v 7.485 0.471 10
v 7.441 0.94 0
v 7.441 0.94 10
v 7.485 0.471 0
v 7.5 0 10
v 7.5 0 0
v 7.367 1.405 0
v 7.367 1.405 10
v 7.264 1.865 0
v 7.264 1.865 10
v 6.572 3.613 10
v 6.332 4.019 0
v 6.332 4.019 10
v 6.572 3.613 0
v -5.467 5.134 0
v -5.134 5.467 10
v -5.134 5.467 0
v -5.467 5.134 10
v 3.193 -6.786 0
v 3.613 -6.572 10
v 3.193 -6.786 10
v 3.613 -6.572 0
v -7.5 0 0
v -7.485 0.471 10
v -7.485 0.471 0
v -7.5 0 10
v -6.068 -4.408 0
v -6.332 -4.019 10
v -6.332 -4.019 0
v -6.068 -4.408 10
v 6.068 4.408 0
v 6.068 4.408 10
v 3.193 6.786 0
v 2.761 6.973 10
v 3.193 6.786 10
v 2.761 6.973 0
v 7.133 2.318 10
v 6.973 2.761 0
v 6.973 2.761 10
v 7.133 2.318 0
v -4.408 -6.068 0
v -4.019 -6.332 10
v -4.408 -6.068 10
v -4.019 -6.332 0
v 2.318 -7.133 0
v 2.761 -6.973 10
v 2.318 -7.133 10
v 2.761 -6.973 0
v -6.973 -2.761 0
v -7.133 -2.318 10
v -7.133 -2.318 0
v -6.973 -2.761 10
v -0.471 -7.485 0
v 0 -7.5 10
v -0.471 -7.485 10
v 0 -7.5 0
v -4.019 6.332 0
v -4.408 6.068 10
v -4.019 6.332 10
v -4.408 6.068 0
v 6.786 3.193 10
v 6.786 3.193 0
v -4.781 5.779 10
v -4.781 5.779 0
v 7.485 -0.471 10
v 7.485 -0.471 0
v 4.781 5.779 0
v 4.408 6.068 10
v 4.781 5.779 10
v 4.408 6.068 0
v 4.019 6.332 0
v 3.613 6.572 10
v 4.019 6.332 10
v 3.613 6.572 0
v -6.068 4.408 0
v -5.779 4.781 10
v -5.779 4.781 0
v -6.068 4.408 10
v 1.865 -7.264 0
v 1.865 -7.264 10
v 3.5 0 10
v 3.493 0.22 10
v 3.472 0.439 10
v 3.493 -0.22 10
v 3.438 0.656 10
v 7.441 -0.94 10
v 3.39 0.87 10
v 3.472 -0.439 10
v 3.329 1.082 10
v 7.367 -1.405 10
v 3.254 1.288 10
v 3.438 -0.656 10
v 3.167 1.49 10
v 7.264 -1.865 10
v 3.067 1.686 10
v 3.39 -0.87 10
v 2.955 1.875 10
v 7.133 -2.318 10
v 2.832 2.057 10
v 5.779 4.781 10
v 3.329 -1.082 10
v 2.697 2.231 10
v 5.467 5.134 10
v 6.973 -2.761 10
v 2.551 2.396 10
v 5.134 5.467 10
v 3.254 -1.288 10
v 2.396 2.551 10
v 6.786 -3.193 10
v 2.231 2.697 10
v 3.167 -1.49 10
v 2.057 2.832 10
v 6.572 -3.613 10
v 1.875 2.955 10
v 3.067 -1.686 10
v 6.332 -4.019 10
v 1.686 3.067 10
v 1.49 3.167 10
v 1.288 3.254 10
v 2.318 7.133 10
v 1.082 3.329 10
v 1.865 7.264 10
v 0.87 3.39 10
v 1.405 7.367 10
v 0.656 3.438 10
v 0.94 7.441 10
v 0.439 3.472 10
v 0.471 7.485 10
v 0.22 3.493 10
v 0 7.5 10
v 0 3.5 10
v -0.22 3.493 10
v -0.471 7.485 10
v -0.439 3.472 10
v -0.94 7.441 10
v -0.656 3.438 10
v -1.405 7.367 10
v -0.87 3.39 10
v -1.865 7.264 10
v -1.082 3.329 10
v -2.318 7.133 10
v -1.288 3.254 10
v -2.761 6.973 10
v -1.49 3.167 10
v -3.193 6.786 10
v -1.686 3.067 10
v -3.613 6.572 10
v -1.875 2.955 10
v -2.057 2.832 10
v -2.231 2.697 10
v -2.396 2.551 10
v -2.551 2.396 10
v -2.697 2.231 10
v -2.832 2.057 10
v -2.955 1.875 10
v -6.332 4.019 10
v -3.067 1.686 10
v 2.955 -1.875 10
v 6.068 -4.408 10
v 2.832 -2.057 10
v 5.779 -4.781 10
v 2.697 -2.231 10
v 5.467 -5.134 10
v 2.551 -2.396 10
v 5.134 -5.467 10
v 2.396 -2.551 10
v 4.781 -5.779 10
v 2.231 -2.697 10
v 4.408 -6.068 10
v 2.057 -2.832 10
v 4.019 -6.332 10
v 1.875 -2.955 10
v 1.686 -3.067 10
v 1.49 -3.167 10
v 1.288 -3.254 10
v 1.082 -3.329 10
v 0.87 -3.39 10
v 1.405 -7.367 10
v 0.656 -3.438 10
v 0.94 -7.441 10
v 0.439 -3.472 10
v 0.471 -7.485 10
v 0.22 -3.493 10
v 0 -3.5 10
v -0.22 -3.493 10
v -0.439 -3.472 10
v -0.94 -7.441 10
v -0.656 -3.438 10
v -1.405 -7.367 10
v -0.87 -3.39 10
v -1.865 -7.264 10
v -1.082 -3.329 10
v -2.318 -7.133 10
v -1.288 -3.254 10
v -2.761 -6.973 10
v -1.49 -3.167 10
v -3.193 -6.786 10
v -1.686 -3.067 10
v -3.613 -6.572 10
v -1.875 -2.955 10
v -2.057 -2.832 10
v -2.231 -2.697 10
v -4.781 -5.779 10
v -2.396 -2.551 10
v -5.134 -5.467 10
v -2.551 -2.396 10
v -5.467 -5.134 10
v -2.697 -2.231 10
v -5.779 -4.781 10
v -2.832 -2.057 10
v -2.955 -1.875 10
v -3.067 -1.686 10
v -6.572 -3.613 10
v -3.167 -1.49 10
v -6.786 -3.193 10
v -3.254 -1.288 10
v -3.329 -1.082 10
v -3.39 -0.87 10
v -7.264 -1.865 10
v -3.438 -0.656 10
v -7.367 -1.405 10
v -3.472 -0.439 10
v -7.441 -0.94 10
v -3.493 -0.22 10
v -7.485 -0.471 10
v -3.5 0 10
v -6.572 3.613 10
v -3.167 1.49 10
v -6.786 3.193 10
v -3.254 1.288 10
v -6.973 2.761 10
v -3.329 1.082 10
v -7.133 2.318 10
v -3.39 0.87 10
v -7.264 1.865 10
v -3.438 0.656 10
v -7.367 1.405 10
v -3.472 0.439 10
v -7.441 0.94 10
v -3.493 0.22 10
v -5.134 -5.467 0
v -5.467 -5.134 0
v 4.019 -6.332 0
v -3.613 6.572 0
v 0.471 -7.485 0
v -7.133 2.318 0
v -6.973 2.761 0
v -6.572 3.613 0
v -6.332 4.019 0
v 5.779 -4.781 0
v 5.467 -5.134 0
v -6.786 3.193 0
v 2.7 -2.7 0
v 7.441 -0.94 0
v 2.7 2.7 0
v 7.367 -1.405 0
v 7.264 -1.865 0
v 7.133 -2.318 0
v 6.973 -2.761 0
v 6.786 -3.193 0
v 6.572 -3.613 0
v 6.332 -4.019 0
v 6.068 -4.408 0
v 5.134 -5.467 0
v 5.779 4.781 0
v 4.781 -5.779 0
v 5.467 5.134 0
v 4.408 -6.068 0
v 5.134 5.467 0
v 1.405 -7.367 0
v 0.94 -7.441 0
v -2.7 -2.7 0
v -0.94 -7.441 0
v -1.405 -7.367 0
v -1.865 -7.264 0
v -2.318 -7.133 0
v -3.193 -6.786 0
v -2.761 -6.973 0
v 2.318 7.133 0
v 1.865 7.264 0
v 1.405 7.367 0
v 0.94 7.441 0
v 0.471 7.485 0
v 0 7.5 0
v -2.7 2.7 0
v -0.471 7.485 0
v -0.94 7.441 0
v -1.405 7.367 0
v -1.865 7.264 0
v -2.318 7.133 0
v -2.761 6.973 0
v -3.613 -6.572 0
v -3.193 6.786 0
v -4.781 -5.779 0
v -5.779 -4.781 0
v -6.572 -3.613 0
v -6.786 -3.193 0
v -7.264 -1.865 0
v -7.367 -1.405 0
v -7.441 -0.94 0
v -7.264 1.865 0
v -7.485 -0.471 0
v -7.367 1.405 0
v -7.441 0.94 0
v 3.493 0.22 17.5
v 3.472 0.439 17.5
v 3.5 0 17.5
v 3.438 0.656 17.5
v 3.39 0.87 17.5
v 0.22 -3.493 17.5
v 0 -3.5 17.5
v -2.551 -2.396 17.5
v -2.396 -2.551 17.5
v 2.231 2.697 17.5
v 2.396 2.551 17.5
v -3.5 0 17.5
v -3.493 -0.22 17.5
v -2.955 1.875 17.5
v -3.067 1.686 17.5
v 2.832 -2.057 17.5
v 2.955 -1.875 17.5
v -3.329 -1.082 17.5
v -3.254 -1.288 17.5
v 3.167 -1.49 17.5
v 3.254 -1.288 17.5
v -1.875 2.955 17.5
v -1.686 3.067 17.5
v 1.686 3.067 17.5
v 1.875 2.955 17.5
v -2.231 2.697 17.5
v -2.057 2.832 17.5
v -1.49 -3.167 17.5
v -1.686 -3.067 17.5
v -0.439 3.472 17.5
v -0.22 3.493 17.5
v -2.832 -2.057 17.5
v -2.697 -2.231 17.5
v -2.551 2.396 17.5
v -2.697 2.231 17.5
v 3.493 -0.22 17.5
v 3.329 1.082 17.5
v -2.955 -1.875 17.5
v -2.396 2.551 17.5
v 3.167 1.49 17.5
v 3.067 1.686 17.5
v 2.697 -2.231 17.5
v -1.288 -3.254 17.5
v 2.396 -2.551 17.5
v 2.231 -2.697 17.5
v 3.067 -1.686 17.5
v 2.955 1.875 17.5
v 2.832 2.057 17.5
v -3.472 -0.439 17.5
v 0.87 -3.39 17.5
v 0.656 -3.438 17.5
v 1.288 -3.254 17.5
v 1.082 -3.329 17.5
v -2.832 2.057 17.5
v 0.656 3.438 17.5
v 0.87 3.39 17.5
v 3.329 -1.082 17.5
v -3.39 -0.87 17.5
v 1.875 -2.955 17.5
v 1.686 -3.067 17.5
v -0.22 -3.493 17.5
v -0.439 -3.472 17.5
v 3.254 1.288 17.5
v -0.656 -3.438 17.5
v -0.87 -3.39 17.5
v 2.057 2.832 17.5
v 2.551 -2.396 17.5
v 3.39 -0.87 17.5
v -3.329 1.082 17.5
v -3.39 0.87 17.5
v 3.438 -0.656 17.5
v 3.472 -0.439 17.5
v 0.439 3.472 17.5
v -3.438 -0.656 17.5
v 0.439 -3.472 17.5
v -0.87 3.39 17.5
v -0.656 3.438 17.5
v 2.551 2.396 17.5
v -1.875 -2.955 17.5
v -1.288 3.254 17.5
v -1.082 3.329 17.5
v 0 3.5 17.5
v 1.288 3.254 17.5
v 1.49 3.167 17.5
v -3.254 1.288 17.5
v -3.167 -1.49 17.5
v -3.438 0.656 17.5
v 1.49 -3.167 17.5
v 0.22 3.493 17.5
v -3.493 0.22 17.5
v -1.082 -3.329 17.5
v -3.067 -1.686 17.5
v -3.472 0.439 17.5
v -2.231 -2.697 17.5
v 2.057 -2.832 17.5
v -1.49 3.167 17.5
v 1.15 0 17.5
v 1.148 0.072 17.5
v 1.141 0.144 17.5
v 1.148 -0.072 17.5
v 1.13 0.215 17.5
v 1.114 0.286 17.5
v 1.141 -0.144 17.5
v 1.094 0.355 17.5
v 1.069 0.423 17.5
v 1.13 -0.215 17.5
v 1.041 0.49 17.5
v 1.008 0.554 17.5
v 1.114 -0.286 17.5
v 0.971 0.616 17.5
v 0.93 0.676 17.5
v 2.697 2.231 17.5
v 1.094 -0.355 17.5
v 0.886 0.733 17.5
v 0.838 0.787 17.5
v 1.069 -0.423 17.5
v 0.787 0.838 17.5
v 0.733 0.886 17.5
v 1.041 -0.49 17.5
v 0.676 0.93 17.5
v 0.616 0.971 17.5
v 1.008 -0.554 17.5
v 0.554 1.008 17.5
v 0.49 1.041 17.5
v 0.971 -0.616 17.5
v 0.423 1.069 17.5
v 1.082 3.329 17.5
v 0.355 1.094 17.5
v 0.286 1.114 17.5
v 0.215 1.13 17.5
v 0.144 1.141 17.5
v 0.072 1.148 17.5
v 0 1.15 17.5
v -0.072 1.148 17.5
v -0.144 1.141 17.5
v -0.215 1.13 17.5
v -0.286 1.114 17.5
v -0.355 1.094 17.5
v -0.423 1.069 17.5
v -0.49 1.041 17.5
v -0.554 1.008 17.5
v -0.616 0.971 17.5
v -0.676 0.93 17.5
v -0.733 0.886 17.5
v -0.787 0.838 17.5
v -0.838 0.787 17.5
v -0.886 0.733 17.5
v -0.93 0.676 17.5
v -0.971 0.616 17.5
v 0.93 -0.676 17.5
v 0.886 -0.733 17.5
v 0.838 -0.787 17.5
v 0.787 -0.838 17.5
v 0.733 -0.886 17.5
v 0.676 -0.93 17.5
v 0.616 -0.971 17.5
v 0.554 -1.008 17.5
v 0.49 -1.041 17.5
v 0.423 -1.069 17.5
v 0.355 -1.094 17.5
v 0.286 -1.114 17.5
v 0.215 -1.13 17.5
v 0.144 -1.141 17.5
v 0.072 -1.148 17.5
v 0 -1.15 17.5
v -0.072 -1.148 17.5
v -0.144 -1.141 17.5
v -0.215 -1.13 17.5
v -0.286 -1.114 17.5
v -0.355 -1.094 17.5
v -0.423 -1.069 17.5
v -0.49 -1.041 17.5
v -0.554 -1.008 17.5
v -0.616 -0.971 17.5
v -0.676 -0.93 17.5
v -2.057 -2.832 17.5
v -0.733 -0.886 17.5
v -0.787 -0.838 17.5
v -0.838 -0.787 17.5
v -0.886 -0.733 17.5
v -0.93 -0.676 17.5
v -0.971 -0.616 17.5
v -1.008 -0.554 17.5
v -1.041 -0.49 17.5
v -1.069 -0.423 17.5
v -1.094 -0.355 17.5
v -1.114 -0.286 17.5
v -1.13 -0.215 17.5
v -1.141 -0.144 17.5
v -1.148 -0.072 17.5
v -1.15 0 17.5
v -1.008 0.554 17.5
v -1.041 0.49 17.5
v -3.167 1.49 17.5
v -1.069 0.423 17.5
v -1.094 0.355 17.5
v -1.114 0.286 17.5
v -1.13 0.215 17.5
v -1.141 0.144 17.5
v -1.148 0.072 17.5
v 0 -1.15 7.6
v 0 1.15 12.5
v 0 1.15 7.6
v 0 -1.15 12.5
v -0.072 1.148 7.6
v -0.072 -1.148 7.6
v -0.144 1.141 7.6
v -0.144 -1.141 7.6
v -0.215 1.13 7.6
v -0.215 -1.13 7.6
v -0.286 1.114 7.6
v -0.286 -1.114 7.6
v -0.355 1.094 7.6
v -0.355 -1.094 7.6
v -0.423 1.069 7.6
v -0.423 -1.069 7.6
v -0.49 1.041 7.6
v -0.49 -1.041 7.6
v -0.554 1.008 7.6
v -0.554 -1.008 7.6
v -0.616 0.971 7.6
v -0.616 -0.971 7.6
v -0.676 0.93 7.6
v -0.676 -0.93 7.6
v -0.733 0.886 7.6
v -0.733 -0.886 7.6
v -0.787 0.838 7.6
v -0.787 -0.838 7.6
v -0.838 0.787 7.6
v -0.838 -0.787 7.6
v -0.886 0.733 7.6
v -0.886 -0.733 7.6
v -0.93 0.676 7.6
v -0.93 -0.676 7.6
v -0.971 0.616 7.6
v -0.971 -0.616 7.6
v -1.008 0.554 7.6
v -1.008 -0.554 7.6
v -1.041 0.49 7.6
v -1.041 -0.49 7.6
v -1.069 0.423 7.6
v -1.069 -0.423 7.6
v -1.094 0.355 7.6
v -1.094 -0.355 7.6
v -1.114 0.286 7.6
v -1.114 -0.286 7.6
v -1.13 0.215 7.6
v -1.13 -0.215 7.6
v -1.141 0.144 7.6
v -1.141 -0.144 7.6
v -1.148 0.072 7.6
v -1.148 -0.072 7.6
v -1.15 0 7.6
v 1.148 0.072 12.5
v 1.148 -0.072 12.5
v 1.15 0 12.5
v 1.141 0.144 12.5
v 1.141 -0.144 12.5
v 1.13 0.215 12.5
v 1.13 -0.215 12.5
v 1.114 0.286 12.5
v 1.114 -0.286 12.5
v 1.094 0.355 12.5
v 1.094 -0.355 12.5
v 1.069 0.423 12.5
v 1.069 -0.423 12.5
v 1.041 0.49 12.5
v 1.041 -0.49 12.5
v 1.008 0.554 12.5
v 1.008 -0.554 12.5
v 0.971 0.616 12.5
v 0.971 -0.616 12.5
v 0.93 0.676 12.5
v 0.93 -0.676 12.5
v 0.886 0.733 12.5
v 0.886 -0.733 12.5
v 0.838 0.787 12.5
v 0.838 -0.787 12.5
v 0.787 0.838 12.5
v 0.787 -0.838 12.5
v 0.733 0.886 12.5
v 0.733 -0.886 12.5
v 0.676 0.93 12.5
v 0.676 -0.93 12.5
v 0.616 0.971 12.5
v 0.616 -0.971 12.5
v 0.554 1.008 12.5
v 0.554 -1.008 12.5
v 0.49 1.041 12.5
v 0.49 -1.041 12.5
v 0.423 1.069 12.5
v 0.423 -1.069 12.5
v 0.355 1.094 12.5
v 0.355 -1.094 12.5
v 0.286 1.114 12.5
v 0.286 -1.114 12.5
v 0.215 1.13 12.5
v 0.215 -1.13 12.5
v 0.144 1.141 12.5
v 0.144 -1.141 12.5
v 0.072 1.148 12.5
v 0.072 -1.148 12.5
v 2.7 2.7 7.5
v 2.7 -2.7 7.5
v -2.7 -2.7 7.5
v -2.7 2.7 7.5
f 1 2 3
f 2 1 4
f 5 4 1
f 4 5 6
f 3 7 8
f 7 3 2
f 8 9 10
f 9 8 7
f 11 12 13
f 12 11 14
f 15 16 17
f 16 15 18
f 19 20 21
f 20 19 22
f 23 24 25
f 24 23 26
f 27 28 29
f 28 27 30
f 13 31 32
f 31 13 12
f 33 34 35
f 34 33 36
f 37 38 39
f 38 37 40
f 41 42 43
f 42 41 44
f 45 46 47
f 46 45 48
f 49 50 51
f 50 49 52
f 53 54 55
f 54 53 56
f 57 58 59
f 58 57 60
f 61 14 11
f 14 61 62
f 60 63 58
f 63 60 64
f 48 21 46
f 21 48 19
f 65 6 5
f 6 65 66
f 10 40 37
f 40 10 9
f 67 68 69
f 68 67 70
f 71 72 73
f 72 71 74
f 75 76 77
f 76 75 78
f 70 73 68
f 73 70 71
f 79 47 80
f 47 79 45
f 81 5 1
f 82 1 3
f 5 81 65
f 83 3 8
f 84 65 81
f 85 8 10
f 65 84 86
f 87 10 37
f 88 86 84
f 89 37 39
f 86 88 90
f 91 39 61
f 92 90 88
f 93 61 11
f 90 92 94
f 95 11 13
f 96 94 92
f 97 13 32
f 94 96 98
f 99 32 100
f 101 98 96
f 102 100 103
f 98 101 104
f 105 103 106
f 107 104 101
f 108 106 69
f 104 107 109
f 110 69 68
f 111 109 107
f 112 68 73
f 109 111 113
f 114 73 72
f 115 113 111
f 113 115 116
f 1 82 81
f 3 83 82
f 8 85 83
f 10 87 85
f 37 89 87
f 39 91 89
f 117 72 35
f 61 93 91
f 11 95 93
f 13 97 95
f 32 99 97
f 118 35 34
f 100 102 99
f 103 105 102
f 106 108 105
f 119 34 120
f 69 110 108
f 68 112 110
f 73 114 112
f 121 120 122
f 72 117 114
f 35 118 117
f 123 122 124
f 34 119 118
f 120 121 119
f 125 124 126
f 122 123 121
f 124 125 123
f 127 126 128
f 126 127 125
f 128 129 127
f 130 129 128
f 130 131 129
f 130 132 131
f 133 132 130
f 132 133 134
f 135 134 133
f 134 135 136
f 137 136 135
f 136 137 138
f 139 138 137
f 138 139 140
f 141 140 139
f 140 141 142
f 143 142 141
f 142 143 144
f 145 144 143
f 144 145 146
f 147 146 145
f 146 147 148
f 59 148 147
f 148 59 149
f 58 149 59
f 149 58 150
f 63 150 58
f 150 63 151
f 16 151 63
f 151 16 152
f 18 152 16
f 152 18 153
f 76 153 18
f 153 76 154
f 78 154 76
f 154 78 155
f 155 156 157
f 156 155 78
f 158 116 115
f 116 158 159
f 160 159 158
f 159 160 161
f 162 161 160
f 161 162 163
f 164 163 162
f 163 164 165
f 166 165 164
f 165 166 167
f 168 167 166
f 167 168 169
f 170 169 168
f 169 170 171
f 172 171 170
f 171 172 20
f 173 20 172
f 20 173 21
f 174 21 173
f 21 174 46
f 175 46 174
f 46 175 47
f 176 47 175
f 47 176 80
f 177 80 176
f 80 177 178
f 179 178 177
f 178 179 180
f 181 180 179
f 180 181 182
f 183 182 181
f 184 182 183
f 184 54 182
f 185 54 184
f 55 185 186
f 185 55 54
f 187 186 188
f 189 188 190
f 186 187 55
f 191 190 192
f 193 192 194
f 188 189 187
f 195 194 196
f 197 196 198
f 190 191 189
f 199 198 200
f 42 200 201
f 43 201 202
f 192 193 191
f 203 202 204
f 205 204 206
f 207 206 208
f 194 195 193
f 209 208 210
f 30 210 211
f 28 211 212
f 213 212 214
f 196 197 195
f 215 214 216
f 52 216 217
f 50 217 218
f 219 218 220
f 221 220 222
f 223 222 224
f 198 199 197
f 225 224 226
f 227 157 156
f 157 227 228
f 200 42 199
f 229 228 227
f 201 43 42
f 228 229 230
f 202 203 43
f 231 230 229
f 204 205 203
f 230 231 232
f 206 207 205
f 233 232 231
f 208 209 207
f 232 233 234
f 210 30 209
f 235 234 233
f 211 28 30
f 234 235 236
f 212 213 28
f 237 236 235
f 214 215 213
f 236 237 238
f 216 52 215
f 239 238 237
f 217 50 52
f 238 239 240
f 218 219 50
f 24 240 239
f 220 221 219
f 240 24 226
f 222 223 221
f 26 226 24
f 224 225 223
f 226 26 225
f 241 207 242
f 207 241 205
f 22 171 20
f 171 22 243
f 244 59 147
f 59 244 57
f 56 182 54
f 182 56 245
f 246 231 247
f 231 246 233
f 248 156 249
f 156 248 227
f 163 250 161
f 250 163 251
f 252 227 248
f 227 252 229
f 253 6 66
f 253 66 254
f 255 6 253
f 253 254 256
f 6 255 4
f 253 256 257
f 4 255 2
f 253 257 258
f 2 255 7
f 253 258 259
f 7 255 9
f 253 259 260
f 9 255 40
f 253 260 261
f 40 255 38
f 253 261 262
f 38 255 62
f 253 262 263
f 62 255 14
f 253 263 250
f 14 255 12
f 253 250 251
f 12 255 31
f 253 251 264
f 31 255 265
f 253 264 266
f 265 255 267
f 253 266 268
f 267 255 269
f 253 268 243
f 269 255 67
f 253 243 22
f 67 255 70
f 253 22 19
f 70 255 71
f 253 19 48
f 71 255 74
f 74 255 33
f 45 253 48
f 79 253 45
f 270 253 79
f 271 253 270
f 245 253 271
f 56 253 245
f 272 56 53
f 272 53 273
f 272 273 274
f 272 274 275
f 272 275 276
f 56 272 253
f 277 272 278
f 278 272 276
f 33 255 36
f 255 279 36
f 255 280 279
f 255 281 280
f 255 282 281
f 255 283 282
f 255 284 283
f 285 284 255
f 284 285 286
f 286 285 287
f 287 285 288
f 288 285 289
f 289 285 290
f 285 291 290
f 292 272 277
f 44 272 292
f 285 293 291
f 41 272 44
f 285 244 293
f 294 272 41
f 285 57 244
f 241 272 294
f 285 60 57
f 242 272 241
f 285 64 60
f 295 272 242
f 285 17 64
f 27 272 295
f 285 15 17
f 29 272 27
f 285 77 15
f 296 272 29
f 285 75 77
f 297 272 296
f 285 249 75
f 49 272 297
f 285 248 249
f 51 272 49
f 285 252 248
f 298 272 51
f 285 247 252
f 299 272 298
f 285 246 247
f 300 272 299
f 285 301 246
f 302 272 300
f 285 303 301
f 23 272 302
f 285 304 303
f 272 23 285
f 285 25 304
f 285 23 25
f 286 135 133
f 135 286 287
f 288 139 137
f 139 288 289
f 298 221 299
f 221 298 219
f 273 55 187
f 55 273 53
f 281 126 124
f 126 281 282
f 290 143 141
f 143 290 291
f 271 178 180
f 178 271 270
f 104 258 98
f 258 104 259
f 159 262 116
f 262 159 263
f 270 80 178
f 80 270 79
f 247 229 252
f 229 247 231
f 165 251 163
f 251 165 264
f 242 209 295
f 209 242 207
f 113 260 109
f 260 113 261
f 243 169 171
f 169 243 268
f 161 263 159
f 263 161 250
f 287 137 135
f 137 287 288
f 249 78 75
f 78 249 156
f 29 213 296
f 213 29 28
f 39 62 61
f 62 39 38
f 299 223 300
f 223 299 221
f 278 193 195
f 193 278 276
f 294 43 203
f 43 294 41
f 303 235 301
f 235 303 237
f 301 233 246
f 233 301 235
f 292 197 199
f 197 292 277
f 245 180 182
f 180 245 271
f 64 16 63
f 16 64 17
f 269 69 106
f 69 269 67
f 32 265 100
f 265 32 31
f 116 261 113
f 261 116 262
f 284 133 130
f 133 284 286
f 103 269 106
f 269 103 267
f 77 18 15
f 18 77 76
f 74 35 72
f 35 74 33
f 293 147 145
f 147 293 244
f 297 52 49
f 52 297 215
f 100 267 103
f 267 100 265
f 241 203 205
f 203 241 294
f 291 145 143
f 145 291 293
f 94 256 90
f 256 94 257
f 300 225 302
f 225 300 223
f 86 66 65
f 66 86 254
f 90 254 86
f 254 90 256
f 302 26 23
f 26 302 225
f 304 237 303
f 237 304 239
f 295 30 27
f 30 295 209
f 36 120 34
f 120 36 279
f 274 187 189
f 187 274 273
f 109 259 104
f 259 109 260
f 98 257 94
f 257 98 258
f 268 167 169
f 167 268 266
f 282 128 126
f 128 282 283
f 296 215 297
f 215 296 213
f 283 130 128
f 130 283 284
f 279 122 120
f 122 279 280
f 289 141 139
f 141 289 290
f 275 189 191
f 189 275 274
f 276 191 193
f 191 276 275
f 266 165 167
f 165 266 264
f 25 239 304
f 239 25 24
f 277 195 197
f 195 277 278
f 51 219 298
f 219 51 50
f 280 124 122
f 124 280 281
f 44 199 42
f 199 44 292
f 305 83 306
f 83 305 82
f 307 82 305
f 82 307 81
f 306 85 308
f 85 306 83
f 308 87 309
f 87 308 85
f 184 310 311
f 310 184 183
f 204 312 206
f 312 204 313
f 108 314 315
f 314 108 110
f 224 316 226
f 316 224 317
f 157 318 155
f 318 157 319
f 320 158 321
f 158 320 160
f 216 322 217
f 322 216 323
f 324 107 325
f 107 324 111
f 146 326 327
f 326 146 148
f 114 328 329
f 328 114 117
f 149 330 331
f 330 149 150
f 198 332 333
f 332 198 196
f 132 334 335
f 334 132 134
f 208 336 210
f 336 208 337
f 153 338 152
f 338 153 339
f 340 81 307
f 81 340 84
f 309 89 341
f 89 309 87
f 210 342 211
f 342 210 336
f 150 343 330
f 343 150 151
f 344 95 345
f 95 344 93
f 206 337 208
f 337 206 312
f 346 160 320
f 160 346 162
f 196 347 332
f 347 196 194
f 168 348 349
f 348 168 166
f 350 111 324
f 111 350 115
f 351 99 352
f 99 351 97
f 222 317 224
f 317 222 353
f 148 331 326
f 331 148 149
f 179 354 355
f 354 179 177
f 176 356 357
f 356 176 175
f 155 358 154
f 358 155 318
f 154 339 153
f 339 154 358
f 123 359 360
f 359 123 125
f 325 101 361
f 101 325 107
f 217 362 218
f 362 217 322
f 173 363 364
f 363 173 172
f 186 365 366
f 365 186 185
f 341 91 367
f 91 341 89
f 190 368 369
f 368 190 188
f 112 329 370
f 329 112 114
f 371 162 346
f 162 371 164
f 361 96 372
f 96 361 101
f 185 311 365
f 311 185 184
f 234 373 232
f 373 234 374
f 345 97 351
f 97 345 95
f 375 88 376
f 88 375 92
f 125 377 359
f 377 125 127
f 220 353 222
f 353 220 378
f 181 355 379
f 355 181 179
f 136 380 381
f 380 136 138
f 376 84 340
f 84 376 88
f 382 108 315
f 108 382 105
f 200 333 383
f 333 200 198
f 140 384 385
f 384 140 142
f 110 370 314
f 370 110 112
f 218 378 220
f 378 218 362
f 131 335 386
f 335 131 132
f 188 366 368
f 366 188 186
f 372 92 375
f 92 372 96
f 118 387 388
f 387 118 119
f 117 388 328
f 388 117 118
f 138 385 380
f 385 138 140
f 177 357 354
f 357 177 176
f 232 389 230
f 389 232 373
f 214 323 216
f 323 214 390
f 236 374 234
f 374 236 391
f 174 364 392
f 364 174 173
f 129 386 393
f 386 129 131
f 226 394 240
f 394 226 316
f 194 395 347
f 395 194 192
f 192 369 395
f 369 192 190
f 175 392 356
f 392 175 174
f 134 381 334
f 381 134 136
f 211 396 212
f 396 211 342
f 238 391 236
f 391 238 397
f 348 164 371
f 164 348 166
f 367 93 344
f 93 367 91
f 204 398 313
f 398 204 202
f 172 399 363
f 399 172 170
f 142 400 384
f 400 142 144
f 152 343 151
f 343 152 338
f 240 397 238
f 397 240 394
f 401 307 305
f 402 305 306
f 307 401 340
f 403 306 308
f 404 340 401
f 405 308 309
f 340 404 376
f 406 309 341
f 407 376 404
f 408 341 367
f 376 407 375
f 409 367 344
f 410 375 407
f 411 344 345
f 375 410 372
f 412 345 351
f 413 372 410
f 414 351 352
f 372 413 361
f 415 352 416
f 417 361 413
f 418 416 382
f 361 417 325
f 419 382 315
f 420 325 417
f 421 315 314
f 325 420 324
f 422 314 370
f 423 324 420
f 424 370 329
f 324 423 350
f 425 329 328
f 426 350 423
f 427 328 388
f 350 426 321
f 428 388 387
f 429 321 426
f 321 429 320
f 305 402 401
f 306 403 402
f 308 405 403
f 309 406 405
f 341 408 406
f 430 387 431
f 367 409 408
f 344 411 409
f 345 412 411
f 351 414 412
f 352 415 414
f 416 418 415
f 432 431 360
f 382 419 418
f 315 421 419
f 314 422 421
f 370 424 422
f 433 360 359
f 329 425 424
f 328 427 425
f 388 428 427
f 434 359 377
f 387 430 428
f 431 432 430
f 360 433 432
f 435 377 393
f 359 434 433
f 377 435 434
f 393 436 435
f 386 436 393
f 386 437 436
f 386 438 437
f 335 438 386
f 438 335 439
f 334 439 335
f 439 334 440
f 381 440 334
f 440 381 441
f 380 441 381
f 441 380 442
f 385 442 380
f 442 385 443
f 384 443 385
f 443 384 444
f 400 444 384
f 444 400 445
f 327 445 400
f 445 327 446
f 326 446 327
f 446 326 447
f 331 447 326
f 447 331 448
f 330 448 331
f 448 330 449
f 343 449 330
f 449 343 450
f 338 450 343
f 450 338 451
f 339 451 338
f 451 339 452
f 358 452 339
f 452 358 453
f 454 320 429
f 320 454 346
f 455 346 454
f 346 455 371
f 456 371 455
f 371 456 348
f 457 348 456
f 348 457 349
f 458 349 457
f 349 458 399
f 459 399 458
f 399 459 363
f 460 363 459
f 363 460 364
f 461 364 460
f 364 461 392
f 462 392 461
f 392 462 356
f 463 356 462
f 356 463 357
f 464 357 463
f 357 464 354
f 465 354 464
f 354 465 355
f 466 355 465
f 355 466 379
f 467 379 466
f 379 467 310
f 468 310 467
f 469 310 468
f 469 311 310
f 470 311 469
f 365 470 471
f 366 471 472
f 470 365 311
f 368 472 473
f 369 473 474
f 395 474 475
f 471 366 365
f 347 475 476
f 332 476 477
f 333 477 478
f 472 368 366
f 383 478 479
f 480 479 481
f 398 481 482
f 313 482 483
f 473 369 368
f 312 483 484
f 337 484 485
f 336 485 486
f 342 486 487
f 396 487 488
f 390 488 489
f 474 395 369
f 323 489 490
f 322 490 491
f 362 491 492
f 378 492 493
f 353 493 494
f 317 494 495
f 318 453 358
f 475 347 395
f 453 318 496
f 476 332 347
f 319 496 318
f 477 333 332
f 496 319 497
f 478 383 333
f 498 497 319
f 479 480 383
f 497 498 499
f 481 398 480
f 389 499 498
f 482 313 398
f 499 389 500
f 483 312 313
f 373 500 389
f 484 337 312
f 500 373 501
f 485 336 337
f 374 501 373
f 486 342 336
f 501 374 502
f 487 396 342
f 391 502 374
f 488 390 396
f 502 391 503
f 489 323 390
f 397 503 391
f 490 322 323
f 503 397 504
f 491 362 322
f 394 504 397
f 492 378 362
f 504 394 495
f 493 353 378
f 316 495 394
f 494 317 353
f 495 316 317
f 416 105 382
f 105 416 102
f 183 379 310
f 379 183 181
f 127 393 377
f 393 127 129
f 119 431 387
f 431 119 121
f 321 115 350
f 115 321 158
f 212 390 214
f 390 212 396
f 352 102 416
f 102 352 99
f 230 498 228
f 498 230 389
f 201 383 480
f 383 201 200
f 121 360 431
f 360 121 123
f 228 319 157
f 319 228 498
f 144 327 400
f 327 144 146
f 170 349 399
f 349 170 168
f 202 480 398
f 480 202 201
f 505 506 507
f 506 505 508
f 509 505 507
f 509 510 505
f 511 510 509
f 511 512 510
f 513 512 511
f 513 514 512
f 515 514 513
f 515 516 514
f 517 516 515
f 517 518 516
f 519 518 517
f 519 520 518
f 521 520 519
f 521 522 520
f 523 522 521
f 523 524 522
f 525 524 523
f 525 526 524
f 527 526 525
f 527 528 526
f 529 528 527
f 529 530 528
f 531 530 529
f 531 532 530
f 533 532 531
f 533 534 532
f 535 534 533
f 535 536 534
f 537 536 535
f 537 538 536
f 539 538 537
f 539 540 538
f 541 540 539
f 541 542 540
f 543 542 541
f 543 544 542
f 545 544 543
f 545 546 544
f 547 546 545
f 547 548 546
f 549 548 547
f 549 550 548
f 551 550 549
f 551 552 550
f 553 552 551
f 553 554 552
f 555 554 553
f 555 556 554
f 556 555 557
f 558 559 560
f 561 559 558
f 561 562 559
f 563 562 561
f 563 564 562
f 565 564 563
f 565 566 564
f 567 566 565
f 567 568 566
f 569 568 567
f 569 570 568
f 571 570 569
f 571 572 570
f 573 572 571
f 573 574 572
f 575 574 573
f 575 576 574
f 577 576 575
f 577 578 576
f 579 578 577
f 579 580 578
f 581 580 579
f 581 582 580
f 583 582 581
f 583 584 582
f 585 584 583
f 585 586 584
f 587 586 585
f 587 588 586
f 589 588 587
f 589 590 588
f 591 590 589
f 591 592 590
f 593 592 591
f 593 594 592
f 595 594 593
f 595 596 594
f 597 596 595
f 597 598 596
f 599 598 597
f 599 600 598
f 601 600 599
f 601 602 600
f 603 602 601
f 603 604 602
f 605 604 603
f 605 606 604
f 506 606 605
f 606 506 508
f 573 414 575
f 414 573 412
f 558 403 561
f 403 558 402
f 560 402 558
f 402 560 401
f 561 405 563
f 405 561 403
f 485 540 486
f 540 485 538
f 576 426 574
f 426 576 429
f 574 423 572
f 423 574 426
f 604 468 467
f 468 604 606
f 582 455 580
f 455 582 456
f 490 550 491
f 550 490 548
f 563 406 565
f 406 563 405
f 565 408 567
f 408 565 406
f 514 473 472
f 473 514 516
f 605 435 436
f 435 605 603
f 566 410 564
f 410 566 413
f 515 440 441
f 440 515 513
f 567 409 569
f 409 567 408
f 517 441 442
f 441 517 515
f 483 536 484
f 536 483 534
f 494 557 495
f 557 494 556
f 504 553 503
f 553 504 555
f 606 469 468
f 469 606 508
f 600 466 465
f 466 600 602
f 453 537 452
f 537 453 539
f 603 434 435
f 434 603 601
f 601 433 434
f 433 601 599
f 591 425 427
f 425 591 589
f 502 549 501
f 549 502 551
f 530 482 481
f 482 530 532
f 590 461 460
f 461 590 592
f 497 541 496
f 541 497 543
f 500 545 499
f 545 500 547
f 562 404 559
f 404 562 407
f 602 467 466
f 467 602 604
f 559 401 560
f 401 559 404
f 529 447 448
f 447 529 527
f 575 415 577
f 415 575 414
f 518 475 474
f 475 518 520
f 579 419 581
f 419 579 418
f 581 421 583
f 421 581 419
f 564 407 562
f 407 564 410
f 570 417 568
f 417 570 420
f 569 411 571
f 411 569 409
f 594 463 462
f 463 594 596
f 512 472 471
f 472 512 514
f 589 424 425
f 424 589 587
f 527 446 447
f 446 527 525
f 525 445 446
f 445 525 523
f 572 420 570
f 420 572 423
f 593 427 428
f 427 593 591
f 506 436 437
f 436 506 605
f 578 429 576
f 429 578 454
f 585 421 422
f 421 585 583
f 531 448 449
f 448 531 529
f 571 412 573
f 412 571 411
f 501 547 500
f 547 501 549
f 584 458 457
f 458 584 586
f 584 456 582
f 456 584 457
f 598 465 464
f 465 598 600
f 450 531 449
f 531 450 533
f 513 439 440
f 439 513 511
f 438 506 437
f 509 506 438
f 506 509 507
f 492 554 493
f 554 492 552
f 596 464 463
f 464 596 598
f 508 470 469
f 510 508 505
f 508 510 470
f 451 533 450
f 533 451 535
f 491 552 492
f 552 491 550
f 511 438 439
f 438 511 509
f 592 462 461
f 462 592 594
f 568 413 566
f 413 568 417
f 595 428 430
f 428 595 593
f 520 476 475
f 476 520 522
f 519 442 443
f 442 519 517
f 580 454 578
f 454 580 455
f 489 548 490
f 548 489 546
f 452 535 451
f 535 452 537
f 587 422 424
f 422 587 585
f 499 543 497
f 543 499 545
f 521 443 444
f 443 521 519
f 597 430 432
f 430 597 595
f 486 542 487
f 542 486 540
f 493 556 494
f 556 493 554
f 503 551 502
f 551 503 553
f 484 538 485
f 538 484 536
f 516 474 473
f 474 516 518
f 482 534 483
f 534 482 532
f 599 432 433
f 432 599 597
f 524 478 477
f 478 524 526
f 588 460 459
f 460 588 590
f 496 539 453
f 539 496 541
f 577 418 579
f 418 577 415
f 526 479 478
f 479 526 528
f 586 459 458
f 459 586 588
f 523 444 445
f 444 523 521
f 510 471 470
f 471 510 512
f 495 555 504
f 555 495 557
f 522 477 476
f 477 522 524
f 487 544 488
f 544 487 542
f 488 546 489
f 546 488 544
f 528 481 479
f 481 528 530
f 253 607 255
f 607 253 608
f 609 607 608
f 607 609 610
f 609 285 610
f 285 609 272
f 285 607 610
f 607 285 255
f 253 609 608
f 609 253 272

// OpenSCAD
$fn=100;
height=10;
diameter=15;

shaftdiam=2.3;
shaftflat=5;
shaftlen=10;
shaftextdiam=7;

coupledepth=7.5;
couplewidth=5.4;

echo("Total height is ",shaftlen+coupledepth);

difference(){
	union(){
		cylinder(h=height,r=diameter/2);
		translate([0,0,height]) cylinder(h=shaftlen-(height-coupledepth),r=shaftextdiam/2);
	}
	union(){
		intersection(){
			cylinder(h=100,r=shaftdiam/2);
			union(){
 				translate([-shaftdiam/2,-shaftdiam/2,coupledepth+0.1]) cube([shaftdiam/2,shaftdiam,100]);
				translate([-shaftdiam/2,-shaftdiam/2,shaftflat+coupledepth]) cube([shaftdiam,shaftdiam,100]);
			}
		}
		cube([couplewidth,couplewidth,coupledepth*2],center=true);
	}
}
